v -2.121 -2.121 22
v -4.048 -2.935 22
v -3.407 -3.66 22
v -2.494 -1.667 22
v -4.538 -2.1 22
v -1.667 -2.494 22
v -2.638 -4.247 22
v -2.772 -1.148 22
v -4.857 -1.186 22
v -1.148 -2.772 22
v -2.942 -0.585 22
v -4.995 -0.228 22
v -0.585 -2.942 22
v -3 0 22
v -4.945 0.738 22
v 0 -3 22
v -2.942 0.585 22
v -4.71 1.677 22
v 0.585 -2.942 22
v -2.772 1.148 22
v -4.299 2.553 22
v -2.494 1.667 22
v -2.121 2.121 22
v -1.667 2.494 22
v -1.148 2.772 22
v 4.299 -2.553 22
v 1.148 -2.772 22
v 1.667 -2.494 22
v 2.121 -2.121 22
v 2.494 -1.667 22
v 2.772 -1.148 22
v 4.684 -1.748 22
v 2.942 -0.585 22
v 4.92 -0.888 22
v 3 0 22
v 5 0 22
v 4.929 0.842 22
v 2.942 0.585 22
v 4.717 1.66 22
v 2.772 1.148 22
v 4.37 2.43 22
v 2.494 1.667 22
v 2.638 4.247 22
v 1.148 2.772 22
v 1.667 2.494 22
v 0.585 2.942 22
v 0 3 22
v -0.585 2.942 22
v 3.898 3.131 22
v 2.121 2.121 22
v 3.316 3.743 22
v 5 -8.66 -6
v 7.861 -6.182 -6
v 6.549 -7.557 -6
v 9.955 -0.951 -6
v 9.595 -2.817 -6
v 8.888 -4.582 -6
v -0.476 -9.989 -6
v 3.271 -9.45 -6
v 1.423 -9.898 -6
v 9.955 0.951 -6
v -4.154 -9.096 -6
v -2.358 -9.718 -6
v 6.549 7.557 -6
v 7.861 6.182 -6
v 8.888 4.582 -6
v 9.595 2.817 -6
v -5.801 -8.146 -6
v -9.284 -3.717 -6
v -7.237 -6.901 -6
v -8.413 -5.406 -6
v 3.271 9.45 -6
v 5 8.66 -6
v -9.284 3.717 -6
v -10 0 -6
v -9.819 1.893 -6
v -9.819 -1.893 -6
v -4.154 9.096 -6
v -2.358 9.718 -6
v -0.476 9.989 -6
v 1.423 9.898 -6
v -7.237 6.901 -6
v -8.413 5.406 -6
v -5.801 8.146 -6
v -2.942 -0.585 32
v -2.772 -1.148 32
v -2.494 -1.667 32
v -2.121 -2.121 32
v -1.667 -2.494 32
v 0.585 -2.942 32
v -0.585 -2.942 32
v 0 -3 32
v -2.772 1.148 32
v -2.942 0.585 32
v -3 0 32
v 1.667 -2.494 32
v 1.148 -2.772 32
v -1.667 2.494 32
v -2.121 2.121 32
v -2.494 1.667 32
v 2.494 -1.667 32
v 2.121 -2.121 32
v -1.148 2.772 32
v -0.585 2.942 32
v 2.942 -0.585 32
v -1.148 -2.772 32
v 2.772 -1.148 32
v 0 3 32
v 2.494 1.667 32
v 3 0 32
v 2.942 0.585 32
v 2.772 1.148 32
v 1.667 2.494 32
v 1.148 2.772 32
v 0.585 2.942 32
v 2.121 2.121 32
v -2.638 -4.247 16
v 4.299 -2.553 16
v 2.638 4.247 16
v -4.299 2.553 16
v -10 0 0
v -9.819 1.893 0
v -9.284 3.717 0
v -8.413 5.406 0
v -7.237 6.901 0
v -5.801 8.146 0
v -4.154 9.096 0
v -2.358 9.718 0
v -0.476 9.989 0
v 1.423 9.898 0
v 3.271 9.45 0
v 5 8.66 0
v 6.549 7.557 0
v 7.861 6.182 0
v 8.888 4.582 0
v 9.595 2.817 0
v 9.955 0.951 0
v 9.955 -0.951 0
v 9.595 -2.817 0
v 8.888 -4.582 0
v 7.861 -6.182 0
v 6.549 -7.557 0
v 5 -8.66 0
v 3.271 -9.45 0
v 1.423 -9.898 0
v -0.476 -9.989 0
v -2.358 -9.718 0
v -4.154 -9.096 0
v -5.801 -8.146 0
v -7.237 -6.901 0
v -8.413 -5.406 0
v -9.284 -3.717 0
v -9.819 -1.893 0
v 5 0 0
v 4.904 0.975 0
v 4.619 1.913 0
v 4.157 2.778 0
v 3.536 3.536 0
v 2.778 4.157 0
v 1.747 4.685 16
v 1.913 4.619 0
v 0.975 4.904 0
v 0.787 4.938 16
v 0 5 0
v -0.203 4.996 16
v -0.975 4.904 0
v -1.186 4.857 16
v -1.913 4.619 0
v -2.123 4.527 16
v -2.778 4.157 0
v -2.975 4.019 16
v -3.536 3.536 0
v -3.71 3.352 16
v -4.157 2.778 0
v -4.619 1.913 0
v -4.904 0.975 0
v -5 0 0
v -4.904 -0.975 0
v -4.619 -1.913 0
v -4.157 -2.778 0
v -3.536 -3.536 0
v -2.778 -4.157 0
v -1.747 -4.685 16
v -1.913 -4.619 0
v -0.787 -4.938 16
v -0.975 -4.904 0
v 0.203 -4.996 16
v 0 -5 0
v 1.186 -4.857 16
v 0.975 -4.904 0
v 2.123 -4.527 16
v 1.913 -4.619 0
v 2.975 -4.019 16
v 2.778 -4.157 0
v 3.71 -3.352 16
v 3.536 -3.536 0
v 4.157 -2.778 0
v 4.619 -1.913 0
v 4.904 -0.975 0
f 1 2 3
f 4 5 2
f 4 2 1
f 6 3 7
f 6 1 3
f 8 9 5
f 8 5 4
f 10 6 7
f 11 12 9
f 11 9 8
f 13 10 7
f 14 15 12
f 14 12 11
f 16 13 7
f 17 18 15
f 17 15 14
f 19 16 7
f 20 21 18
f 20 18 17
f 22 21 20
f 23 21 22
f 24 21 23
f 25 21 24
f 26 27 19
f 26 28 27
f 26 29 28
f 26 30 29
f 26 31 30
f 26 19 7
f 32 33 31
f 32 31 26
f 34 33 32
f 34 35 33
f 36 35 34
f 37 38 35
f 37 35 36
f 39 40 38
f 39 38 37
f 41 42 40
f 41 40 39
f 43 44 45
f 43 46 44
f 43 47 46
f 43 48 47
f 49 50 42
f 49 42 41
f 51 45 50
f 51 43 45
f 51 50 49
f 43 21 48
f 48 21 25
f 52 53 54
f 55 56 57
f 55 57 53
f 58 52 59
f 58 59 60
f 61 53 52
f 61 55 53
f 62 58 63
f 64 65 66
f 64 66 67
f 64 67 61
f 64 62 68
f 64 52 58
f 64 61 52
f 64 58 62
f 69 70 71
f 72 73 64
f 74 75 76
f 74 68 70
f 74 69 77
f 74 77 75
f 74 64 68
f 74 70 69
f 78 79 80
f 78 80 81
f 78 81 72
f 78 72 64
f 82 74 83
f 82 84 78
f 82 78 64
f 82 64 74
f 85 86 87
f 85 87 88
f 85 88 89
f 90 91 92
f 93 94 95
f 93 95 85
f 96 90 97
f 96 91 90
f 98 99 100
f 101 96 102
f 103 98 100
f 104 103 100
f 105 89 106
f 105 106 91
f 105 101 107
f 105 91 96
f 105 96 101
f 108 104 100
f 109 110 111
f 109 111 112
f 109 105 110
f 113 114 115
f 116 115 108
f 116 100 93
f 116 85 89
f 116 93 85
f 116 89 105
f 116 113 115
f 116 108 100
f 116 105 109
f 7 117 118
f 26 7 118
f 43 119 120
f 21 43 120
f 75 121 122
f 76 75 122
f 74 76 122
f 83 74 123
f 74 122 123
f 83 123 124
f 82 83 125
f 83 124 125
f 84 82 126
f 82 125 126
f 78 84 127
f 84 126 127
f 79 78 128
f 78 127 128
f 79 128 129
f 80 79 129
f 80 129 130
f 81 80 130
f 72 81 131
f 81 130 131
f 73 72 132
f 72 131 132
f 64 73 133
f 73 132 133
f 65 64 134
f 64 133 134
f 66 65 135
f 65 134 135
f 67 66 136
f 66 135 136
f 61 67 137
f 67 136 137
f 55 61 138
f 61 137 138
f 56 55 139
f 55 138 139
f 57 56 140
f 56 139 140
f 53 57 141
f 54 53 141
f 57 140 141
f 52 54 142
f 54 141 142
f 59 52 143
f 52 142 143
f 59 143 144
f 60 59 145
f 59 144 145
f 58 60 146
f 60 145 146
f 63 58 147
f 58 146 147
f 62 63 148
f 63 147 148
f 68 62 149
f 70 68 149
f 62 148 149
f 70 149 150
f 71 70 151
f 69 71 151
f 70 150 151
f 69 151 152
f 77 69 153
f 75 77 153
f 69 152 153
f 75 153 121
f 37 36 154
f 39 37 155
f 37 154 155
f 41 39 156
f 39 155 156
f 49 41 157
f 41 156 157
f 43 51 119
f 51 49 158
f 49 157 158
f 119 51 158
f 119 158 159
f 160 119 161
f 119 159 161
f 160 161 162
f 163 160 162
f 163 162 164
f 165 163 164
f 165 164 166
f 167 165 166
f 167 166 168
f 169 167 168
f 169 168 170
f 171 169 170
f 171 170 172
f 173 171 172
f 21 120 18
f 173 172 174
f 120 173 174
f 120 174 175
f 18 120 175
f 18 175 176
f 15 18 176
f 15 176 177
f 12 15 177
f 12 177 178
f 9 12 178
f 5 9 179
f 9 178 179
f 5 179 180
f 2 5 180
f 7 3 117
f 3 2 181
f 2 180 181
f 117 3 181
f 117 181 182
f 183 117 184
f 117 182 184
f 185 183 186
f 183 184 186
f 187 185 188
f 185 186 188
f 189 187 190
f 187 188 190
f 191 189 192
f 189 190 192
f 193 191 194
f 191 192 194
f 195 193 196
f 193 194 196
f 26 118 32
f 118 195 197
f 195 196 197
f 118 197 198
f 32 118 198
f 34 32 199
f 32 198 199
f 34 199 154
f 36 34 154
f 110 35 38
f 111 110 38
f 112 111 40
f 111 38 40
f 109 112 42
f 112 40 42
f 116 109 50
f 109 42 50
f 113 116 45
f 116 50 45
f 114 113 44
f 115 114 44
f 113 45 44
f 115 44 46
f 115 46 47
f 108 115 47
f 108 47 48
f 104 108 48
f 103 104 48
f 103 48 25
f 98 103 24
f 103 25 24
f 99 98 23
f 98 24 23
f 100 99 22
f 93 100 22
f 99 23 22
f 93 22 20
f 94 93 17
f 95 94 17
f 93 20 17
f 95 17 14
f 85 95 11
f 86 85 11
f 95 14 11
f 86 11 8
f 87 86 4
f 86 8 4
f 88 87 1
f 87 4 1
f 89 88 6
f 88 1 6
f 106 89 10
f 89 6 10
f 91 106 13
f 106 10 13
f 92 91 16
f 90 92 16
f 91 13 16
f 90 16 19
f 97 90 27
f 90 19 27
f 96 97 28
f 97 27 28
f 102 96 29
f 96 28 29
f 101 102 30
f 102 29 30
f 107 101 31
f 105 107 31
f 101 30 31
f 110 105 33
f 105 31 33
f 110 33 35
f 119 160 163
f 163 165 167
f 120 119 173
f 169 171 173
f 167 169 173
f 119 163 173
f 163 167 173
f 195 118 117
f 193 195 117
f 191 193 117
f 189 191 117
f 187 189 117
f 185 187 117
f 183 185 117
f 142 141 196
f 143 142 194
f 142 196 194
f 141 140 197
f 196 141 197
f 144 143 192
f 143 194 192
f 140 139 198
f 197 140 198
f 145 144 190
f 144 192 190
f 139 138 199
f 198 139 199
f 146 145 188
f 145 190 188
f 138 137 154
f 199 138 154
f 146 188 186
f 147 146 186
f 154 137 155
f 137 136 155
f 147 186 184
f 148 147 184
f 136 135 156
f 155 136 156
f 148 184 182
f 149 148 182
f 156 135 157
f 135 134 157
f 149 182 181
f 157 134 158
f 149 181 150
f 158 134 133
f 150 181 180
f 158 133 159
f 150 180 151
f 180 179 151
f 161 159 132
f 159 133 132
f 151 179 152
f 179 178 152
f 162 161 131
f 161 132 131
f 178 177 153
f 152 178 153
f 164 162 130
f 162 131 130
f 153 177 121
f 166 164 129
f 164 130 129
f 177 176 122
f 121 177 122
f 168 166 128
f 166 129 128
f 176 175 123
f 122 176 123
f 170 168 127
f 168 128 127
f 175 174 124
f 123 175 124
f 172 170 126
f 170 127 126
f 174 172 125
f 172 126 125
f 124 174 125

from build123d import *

# Parameters (mm, degrees)
SKETCH1_R           = 5
BOSS_EXTRUDE1_DEPTH = 22
CUT_EXTRUDE1_START  = -6
CUT_EXTRUDE1_DEPTH  = 6
SKETCH3_R           = 3
BOSS_EXTRUDE2_DEPTH = 10
SKETCH4_R           = 10
BOSS_EXTRUDE3_DEPTH = 6


with BuildPart() as part:
    # Sketch1 → Boss-Extrude1 (new body)
    with BuildSketch(Plane.XY):
        Circle(SKETCH1_R)
    extrude(amount=BOSS_EXTRUDE1_DEPTH)

    # Sketch2 → Cut-Extrude1 (cut)
    with BuildSketch(Plane.XY.offset(22).offset(CUT_EXTRUDE1_START)):
        with BuildLine():
            Line((2.638277831, 4.247292089), (-4.299208102, 2.552804281))
            ThreePointArc((-4.299208102, 2.552804281), (-1.186378765, 4.857211693), (2.638277831, 4.247292089))
        make_face()
        with BuildLine():
            Line((-2.638277831, -4.247292089), (4.299208102, -2.552804281))
            ThreePointArc((4.299208102, -2.552804281), (1.186378765, -4.857211693), (-2.638277831, -4.247292089))
        make_face()
    extrude(amount=CUT_EXTRUDE1_DEPTH, mode=Mode.SUBTRACT)

    # Sketch3 → Boss-Extrude2 (add)
    with BuildSketch(Plane.XY.offset(22)):
        Circle(SKETCH3_R)
    extrude(amount=BOSS_EXTRUDE2_DEPTH)

    # Sketch4 → Boss-Extrude3 (add)
    with BuildSketch(Plane(origin=(0, 0, 0), x_dir=(-1, 0, 0), z_dir=(0, 0, -1))):
        Circle(SKETCH4_R)
    extrude(amount=BOSS_EXTRUDE3_DEPTH)


solid = part.part
